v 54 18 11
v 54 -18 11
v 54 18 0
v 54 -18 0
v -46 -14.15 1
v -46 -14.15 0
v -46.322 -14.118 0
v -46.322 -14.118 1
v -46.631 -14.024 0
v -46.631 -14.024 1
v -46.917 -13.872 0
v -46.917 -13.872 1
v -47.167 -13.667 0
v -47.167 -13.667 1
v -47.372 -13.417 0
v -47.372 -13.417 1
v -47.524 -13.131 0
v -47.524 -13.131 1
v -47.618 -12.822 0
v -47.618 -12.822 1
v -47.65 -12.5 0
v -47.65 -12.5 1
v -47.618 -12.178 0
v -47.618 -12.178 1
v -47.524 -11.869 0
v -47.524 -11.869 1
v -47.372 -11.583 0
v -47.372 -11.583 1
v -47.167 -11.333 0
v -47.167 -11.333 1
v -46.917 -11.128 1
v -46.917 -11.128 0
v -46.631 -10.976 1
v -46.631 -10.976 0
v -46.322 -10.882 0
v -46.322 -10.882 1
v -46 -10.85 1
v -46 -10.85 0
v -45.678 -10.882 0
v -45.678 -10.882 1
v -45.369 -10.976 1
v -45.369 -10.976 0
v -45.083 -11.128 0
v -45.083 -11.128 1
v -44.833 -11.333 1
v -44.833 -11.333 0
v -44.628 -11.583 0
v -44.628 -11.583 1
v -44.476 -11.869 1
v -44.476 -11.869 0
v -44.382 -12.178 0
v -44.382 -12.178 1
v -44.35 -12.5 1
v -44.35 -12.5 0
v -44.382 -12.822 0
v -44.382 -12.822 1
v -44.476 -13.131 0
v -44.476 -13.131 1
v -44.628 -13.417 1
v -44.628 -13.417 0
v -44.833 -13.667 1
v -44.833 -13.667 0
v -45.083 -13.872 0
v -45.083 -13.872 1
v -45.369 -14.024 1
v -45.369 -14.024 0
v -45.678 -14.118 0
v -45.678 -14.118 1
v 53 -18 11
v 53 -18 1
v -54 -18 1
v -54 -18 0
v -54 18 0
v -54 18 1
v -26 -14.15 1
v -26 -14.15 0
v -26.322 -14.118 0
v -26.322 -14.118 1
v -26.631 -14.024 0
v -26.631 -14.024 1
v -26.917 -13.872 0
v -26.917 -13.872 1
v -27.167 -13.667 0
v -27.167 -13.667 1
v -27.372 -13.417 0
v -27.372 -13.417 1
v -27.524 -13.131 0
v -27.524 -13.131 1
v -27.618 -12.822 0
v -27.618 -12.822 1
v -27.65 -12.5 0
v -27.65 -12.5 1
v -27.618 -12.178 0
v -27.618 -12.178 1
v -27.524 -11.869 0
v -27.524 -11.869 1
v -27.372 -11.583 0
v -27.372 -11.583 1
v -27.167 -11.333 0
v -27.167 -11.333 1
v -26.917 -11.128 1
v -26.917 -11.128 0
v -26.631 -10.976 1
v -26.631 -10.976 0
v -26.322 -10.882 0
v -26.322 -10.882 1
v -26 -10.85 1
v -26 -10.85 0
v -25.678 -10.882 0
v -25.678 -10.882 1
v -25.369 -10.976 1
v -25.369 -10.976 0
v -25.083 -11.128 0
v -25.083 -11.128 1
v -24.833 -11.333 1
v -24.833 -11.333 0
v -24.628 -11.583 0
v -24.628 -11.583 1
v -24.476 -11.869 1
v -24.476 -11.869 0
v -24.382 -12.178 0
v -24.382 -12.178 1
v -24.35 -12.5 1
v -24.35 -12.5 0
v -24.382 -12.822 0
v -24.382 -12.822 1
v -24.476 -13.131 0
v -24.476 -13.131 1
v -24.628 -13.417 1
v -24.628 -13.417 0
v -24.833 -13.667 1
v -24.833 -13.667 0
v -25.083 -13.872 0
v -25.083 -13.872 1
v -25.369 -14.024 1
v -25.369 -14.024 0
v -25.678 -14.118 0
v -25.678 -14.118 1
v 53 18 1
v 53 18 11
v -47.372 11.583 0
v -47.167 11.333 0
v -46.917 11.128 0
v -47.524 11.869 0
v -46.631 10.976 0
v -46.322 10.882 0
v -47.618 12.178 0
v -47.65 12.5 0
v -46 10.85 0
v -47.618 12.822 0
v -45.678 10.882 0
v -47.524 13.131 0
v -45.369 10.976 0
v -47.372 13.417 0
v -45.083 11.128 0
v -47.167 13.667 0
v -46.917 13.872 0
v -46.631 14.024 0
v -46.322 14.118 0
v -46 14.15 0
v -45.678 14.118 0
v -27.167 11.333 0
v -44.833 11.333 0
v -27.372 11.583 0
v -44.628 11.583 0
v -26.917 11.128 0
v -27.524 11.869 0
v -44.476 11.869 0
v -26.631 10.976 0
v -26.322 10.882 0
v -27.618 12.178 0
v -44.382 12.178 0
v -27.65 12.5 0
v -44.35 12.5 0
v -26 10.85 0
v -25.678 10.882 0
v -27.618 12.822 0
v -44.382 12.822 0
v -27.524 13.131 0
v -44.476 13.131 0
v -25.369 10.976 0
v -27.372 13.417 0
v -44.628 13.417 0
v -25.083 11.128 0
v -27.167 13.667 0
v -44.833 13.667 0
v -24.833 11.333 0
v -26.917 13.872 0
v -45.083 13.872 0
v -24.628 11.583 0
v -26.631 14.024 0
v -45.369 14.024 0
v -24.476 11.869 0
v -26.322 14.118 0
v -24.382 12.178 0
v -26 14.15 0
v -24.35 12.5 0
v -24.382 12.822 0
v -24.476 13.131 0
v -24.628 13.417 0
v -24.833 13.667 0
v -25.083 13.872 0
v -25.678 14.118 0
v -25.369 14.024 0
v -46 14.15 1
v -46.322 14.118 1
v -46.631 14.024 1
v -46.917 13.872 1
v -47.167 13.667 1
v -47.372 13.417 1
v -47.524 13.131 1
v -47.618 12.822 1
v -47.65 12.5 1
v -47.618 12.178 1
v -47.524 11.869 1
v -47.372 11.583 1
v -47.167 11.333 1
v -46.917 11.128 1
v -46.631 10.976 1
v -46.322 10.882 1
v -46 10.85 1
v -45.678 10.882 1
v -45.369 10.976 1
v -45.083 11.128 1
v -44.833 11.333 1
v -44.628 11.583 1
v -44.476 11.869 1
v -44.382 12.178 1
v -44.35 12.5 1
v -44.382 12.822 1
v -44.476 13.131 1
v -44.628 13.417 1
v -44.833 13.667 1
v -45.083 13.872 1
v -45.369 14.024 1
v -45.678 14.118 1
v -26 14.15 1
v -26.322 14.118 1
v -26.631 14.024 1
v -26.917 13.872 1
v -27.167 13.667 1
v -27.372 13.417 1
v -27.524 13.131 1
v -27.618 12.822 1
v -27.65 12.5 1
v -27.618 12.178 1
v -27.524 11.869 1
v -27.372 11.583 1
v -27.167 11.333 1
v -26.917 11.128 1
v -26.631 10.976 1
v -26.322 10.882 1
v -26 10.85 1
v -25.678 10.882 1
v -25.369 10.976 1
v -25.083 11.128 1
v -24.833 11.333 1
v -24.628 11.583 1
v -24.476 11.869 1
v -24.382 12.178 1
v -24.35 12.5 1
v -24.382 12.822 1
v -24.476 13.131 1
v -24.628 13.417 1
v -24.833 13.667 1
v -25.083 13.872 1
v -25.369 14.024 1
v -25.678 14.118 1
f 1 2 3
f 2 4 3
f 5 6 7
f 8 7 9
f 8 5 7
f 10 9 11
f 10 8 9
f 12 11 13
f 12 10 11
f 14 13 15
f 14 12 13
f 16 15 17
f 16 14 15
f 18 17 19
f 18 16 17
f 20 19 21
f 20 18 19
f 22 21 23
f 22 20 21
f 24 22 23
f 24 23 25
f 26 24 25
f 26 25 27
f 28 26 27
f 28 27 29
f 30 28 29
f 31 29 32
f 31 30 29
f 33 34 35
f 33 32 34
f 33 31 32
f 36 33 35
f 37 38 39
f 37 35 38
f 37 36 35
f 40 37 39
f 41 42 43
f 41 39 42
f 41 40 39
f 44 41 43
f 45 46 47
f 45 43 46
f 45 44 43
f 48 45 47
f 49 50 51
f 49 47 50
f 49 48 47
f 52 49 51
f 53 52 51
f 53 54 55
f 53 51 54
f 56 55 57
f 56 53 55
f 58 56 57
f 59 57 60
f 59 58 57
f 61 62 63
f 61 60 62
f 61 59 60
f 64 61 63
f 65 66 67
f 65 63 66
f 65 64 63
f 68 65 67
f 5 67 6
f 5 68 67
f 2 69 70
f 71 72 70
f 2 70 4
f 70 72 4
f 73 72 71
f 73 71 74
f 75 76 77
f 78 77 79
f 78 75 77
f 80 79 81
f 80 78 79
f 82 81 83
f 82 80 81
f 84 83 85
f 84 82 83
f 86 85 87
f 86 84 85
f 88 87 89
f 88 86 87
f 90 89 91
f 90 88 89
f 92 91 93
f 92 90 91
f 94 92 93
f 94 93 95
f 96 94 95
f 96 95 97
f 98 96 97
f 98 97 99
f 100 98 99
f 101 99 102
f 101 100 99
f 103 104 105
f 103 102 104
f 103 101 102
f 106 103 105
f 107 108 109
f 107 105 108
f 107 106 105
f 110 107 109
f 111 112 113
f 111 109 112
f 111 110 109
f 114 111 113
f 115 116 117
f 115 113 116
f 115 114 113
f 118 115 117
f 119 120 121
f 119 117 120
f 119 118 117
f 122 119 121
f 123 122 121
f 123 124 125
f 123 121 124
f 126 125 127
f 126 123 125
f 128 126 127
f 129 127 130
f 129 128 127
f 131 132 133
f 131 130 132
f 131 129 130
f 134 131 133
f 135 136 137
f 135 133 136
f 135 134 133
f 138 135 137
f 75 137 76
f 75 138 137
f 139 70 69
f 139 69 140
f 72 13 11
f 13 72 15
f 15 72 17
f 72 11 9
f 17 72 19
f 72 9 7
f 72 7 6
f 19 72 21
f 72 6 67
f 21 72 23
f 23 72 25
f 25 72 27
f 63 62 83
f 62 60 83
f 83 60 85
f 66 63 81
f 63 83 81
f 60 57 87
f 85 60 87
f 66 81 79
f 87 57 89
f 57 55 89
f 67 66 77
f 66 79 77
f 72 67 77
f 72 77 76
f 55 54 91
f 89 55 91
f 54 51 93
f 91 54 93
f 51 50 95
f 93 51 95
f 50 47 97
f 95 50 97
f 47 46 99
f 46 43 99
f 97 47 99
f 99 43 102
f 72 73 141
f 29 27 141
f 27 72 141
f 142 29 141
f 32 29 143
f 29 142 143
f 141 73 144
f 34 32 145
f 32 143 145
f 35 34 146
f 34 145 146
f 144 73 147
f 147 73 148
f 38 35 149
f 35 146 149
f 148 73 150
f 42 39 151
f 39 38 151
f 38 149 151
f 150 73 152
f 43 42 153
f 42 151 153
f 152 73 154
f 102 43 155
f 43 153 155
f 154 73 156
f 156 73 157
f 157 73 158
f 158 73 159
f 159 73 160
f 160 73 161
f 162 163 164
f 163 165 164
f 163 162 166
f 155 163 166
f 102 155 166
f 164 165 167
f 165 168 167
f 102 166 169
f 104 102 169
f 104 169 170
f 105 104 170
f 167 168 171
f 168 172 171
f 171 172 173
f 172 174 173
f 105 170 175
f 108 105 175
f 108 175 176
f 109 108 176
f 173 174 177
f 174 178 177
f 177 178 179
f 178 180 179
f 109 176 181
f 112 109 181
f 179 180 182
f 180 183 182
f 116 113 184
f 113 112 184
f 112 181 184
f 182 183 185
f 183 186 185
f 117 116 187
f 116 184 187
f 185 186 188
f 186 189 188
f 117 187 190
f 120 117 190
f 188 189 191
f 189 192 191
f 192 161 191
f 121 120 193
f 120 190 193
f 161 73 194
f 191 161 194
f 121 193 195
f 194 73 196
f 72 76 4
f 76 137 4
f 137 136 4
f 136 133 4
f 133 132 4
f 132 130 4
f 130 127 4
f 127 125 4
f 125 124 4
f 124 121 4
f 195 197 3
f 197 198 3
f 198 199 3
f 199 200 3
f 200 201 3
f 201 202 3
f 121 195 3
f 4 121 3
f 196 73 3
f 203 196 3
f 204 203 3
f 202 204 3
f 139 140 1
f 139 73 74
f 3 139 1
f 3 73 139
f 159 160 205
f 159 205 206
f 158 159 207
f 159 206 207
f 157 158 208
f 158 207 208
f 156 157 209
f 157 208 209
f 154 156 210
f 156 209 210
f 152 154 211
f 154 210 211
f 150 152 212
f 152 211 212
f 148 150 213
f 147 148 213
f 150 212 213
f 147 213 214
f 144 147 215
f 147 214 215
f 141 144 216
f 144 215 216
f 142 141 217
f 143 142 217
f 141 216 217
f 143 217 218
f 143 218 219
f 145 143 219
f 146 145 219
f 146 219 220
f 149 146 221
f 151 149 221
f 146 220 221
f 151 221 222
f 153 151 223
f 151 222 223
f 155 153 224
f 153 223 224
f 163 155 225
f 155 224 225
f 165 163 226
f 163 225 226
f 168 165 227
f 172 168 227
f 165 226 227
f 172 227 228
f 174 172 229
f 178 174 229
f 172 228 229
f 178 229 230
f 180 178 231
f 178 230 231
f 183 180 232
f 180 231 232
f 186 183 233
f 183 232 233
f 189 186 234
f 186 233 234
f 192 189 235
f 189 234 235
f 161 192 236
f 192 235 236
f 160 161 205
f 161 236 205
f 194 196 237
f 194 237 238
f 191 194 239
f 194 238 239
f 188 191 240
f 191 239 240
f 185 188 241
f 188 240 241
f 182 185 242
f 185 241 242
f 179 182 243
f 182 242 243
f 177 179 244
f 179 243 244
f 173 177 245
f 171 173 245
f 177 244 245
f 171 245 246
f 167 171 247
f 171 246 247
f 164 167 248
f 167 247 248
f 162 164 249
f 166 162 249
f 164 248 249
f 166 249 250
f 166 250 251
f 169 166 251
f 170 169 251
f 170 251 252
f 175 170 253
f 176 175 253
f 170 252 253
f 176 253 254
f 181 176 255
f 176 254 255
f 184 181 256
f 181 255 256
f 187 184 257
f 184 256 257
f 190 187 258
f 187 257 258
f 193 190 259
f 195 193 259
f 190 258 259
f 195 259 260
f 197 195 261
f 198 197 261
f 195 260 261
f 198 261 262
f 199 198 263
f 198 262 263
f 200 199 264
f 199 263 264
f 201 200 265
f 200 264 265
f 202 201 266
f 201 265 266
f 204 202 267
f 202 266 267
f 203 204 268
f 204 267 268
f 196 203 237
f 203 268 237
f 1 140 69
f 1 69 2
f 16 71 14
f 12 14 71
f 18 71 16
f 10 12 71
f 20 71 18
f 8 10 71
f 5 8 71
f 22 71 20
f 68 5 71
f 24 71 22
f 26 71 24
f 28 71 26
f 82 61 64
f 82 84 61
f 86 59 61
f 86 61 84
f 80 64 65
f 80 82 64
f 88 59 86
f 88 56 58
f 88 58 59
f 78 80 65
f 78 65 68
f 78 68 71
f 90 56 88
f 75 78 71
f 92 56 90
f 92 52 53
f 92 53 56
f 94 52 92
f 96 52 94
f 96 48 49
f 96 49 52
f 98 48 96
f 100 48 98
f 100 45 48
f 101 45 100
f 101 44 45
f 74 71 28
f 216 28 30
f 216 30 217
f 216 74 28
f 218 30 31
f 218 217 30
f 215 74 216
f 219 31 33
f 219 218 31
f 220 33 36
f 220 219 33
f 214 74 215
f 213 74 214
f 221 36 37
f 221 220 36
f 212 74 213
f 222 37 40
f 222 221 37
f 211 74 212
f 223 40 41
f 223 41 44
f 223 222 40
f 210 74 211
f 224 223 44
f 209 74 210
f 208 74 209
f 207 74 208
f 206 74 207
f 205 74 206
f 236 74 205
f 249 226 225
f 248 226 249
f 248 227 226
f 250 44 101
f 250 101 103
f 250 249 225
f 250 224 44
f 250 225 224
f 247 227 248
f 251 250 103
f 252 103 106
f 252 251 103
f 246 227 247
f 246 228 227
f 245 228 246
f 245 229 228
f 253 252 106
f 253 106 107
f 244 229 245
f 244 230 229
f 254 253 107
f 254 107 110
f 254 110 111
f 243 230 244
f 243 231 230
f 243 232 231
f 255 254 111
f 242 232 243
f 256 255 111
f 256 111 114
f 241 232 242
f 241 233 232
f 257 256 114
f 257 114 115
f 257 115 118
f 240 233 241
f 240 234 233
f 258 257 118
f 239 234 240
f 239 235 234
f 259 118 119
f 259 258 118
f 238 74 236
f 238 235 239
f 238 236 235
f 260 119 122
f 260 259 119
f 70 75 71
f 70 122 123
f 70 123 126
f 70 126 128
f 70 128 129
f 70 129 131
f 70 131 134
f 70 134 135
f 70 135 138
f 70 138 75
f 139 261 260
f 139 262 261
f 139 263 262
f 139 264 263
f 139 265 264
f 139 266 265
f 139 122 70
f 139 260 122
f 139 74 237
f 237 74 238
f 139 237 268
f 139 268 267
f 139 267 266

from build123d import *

# Parameters (mm, degrees)
SKETCH_1_W                  = 108
SKETCH_1_H                  = 36
EXTRUDE_1_DEPTH             = 1
HOLE_WIZARD_M4_1_AT_2_COUNT = 2
HOLE_WIZARD_M4_1_AT_2_PITCH = 20
SKETCH_4_W                  = 1
SKETCH_4_H                  = 36
EXTRUDE_2_DEPTH             = 10


with BuildPart() as part:
    # 草图1 → 凸台-拉伸1 (new body)
    with BuildSketch(Plane.XY):
        Rectangle(SKETCH_1_W, SKETCH_1_H)
    extrude(amount=EXTRUDE_1_DEPTH)

    # 草图3 → M4 螺纹孔的螺纹孔钻头1 (revolve, cut)
    with BuildSketch(Plane(origin=(-46, -12.5, 1), x_dir=(0, -1, 0), z_dir=(1, 0, 0))):
        Polygon((0, 0), (0, 10.991420021), (1.65, 10), (1.65, 0), align=None)
    hole_wizard_m4_1 = revolve(axis=Axis((-46, -12.5, 7.35), (0, 0, -1)), mode=Mode.SUBTRACT)

    # M4 螺纹孔的螺纹孔钻头1 at 2: M4 螺纹孔的螺纹孔钻头1 ×2
    with Locations(*[(i * HOLE_WIZARD_M4_1_AT_2_PITCH, 0, 0) for i in range(1, HOLE_WIZARD_M4_1_AT_2_COUNT)]):
        add(hole_wizard_m4_1, mode=Mode.SUBTRACT)

    # 镜向1: M4 螺纹孔的螺纹孔钻头1 across plane
    add(hole_wizard_m4_1.mirror(Plane.ZX), mode=Mode.SUBTRACT)

    # 镜向1 copy 1 sketch → 镜向1 copy 1 (revolve, cut)
    with BuildSketch(Plane(origin=(-26, 12.5, 1), x_dir=(0, 1, 0), z_dir=(1, 0, 0))):
        Polygon((0, 0), (0, -10.991420021), (1.65, -10), (1.65, 0), align=None)
    revolve(axis=Axis((-26, 12.5, 7.35), (0, 0, 1)), mode=Mode.SUBTRACT)

    # 草图4 → 凸台-拉伸2 (add)
    with BuildSketch(Plane.XY.offset(1)):
        with Locations((53.5, 0)):
            Rectangle(SKETCH_4_W, SKETCH_4_H)
    extrude(amount=EXTRUDE_2_DEPTH)


solid = part.part
